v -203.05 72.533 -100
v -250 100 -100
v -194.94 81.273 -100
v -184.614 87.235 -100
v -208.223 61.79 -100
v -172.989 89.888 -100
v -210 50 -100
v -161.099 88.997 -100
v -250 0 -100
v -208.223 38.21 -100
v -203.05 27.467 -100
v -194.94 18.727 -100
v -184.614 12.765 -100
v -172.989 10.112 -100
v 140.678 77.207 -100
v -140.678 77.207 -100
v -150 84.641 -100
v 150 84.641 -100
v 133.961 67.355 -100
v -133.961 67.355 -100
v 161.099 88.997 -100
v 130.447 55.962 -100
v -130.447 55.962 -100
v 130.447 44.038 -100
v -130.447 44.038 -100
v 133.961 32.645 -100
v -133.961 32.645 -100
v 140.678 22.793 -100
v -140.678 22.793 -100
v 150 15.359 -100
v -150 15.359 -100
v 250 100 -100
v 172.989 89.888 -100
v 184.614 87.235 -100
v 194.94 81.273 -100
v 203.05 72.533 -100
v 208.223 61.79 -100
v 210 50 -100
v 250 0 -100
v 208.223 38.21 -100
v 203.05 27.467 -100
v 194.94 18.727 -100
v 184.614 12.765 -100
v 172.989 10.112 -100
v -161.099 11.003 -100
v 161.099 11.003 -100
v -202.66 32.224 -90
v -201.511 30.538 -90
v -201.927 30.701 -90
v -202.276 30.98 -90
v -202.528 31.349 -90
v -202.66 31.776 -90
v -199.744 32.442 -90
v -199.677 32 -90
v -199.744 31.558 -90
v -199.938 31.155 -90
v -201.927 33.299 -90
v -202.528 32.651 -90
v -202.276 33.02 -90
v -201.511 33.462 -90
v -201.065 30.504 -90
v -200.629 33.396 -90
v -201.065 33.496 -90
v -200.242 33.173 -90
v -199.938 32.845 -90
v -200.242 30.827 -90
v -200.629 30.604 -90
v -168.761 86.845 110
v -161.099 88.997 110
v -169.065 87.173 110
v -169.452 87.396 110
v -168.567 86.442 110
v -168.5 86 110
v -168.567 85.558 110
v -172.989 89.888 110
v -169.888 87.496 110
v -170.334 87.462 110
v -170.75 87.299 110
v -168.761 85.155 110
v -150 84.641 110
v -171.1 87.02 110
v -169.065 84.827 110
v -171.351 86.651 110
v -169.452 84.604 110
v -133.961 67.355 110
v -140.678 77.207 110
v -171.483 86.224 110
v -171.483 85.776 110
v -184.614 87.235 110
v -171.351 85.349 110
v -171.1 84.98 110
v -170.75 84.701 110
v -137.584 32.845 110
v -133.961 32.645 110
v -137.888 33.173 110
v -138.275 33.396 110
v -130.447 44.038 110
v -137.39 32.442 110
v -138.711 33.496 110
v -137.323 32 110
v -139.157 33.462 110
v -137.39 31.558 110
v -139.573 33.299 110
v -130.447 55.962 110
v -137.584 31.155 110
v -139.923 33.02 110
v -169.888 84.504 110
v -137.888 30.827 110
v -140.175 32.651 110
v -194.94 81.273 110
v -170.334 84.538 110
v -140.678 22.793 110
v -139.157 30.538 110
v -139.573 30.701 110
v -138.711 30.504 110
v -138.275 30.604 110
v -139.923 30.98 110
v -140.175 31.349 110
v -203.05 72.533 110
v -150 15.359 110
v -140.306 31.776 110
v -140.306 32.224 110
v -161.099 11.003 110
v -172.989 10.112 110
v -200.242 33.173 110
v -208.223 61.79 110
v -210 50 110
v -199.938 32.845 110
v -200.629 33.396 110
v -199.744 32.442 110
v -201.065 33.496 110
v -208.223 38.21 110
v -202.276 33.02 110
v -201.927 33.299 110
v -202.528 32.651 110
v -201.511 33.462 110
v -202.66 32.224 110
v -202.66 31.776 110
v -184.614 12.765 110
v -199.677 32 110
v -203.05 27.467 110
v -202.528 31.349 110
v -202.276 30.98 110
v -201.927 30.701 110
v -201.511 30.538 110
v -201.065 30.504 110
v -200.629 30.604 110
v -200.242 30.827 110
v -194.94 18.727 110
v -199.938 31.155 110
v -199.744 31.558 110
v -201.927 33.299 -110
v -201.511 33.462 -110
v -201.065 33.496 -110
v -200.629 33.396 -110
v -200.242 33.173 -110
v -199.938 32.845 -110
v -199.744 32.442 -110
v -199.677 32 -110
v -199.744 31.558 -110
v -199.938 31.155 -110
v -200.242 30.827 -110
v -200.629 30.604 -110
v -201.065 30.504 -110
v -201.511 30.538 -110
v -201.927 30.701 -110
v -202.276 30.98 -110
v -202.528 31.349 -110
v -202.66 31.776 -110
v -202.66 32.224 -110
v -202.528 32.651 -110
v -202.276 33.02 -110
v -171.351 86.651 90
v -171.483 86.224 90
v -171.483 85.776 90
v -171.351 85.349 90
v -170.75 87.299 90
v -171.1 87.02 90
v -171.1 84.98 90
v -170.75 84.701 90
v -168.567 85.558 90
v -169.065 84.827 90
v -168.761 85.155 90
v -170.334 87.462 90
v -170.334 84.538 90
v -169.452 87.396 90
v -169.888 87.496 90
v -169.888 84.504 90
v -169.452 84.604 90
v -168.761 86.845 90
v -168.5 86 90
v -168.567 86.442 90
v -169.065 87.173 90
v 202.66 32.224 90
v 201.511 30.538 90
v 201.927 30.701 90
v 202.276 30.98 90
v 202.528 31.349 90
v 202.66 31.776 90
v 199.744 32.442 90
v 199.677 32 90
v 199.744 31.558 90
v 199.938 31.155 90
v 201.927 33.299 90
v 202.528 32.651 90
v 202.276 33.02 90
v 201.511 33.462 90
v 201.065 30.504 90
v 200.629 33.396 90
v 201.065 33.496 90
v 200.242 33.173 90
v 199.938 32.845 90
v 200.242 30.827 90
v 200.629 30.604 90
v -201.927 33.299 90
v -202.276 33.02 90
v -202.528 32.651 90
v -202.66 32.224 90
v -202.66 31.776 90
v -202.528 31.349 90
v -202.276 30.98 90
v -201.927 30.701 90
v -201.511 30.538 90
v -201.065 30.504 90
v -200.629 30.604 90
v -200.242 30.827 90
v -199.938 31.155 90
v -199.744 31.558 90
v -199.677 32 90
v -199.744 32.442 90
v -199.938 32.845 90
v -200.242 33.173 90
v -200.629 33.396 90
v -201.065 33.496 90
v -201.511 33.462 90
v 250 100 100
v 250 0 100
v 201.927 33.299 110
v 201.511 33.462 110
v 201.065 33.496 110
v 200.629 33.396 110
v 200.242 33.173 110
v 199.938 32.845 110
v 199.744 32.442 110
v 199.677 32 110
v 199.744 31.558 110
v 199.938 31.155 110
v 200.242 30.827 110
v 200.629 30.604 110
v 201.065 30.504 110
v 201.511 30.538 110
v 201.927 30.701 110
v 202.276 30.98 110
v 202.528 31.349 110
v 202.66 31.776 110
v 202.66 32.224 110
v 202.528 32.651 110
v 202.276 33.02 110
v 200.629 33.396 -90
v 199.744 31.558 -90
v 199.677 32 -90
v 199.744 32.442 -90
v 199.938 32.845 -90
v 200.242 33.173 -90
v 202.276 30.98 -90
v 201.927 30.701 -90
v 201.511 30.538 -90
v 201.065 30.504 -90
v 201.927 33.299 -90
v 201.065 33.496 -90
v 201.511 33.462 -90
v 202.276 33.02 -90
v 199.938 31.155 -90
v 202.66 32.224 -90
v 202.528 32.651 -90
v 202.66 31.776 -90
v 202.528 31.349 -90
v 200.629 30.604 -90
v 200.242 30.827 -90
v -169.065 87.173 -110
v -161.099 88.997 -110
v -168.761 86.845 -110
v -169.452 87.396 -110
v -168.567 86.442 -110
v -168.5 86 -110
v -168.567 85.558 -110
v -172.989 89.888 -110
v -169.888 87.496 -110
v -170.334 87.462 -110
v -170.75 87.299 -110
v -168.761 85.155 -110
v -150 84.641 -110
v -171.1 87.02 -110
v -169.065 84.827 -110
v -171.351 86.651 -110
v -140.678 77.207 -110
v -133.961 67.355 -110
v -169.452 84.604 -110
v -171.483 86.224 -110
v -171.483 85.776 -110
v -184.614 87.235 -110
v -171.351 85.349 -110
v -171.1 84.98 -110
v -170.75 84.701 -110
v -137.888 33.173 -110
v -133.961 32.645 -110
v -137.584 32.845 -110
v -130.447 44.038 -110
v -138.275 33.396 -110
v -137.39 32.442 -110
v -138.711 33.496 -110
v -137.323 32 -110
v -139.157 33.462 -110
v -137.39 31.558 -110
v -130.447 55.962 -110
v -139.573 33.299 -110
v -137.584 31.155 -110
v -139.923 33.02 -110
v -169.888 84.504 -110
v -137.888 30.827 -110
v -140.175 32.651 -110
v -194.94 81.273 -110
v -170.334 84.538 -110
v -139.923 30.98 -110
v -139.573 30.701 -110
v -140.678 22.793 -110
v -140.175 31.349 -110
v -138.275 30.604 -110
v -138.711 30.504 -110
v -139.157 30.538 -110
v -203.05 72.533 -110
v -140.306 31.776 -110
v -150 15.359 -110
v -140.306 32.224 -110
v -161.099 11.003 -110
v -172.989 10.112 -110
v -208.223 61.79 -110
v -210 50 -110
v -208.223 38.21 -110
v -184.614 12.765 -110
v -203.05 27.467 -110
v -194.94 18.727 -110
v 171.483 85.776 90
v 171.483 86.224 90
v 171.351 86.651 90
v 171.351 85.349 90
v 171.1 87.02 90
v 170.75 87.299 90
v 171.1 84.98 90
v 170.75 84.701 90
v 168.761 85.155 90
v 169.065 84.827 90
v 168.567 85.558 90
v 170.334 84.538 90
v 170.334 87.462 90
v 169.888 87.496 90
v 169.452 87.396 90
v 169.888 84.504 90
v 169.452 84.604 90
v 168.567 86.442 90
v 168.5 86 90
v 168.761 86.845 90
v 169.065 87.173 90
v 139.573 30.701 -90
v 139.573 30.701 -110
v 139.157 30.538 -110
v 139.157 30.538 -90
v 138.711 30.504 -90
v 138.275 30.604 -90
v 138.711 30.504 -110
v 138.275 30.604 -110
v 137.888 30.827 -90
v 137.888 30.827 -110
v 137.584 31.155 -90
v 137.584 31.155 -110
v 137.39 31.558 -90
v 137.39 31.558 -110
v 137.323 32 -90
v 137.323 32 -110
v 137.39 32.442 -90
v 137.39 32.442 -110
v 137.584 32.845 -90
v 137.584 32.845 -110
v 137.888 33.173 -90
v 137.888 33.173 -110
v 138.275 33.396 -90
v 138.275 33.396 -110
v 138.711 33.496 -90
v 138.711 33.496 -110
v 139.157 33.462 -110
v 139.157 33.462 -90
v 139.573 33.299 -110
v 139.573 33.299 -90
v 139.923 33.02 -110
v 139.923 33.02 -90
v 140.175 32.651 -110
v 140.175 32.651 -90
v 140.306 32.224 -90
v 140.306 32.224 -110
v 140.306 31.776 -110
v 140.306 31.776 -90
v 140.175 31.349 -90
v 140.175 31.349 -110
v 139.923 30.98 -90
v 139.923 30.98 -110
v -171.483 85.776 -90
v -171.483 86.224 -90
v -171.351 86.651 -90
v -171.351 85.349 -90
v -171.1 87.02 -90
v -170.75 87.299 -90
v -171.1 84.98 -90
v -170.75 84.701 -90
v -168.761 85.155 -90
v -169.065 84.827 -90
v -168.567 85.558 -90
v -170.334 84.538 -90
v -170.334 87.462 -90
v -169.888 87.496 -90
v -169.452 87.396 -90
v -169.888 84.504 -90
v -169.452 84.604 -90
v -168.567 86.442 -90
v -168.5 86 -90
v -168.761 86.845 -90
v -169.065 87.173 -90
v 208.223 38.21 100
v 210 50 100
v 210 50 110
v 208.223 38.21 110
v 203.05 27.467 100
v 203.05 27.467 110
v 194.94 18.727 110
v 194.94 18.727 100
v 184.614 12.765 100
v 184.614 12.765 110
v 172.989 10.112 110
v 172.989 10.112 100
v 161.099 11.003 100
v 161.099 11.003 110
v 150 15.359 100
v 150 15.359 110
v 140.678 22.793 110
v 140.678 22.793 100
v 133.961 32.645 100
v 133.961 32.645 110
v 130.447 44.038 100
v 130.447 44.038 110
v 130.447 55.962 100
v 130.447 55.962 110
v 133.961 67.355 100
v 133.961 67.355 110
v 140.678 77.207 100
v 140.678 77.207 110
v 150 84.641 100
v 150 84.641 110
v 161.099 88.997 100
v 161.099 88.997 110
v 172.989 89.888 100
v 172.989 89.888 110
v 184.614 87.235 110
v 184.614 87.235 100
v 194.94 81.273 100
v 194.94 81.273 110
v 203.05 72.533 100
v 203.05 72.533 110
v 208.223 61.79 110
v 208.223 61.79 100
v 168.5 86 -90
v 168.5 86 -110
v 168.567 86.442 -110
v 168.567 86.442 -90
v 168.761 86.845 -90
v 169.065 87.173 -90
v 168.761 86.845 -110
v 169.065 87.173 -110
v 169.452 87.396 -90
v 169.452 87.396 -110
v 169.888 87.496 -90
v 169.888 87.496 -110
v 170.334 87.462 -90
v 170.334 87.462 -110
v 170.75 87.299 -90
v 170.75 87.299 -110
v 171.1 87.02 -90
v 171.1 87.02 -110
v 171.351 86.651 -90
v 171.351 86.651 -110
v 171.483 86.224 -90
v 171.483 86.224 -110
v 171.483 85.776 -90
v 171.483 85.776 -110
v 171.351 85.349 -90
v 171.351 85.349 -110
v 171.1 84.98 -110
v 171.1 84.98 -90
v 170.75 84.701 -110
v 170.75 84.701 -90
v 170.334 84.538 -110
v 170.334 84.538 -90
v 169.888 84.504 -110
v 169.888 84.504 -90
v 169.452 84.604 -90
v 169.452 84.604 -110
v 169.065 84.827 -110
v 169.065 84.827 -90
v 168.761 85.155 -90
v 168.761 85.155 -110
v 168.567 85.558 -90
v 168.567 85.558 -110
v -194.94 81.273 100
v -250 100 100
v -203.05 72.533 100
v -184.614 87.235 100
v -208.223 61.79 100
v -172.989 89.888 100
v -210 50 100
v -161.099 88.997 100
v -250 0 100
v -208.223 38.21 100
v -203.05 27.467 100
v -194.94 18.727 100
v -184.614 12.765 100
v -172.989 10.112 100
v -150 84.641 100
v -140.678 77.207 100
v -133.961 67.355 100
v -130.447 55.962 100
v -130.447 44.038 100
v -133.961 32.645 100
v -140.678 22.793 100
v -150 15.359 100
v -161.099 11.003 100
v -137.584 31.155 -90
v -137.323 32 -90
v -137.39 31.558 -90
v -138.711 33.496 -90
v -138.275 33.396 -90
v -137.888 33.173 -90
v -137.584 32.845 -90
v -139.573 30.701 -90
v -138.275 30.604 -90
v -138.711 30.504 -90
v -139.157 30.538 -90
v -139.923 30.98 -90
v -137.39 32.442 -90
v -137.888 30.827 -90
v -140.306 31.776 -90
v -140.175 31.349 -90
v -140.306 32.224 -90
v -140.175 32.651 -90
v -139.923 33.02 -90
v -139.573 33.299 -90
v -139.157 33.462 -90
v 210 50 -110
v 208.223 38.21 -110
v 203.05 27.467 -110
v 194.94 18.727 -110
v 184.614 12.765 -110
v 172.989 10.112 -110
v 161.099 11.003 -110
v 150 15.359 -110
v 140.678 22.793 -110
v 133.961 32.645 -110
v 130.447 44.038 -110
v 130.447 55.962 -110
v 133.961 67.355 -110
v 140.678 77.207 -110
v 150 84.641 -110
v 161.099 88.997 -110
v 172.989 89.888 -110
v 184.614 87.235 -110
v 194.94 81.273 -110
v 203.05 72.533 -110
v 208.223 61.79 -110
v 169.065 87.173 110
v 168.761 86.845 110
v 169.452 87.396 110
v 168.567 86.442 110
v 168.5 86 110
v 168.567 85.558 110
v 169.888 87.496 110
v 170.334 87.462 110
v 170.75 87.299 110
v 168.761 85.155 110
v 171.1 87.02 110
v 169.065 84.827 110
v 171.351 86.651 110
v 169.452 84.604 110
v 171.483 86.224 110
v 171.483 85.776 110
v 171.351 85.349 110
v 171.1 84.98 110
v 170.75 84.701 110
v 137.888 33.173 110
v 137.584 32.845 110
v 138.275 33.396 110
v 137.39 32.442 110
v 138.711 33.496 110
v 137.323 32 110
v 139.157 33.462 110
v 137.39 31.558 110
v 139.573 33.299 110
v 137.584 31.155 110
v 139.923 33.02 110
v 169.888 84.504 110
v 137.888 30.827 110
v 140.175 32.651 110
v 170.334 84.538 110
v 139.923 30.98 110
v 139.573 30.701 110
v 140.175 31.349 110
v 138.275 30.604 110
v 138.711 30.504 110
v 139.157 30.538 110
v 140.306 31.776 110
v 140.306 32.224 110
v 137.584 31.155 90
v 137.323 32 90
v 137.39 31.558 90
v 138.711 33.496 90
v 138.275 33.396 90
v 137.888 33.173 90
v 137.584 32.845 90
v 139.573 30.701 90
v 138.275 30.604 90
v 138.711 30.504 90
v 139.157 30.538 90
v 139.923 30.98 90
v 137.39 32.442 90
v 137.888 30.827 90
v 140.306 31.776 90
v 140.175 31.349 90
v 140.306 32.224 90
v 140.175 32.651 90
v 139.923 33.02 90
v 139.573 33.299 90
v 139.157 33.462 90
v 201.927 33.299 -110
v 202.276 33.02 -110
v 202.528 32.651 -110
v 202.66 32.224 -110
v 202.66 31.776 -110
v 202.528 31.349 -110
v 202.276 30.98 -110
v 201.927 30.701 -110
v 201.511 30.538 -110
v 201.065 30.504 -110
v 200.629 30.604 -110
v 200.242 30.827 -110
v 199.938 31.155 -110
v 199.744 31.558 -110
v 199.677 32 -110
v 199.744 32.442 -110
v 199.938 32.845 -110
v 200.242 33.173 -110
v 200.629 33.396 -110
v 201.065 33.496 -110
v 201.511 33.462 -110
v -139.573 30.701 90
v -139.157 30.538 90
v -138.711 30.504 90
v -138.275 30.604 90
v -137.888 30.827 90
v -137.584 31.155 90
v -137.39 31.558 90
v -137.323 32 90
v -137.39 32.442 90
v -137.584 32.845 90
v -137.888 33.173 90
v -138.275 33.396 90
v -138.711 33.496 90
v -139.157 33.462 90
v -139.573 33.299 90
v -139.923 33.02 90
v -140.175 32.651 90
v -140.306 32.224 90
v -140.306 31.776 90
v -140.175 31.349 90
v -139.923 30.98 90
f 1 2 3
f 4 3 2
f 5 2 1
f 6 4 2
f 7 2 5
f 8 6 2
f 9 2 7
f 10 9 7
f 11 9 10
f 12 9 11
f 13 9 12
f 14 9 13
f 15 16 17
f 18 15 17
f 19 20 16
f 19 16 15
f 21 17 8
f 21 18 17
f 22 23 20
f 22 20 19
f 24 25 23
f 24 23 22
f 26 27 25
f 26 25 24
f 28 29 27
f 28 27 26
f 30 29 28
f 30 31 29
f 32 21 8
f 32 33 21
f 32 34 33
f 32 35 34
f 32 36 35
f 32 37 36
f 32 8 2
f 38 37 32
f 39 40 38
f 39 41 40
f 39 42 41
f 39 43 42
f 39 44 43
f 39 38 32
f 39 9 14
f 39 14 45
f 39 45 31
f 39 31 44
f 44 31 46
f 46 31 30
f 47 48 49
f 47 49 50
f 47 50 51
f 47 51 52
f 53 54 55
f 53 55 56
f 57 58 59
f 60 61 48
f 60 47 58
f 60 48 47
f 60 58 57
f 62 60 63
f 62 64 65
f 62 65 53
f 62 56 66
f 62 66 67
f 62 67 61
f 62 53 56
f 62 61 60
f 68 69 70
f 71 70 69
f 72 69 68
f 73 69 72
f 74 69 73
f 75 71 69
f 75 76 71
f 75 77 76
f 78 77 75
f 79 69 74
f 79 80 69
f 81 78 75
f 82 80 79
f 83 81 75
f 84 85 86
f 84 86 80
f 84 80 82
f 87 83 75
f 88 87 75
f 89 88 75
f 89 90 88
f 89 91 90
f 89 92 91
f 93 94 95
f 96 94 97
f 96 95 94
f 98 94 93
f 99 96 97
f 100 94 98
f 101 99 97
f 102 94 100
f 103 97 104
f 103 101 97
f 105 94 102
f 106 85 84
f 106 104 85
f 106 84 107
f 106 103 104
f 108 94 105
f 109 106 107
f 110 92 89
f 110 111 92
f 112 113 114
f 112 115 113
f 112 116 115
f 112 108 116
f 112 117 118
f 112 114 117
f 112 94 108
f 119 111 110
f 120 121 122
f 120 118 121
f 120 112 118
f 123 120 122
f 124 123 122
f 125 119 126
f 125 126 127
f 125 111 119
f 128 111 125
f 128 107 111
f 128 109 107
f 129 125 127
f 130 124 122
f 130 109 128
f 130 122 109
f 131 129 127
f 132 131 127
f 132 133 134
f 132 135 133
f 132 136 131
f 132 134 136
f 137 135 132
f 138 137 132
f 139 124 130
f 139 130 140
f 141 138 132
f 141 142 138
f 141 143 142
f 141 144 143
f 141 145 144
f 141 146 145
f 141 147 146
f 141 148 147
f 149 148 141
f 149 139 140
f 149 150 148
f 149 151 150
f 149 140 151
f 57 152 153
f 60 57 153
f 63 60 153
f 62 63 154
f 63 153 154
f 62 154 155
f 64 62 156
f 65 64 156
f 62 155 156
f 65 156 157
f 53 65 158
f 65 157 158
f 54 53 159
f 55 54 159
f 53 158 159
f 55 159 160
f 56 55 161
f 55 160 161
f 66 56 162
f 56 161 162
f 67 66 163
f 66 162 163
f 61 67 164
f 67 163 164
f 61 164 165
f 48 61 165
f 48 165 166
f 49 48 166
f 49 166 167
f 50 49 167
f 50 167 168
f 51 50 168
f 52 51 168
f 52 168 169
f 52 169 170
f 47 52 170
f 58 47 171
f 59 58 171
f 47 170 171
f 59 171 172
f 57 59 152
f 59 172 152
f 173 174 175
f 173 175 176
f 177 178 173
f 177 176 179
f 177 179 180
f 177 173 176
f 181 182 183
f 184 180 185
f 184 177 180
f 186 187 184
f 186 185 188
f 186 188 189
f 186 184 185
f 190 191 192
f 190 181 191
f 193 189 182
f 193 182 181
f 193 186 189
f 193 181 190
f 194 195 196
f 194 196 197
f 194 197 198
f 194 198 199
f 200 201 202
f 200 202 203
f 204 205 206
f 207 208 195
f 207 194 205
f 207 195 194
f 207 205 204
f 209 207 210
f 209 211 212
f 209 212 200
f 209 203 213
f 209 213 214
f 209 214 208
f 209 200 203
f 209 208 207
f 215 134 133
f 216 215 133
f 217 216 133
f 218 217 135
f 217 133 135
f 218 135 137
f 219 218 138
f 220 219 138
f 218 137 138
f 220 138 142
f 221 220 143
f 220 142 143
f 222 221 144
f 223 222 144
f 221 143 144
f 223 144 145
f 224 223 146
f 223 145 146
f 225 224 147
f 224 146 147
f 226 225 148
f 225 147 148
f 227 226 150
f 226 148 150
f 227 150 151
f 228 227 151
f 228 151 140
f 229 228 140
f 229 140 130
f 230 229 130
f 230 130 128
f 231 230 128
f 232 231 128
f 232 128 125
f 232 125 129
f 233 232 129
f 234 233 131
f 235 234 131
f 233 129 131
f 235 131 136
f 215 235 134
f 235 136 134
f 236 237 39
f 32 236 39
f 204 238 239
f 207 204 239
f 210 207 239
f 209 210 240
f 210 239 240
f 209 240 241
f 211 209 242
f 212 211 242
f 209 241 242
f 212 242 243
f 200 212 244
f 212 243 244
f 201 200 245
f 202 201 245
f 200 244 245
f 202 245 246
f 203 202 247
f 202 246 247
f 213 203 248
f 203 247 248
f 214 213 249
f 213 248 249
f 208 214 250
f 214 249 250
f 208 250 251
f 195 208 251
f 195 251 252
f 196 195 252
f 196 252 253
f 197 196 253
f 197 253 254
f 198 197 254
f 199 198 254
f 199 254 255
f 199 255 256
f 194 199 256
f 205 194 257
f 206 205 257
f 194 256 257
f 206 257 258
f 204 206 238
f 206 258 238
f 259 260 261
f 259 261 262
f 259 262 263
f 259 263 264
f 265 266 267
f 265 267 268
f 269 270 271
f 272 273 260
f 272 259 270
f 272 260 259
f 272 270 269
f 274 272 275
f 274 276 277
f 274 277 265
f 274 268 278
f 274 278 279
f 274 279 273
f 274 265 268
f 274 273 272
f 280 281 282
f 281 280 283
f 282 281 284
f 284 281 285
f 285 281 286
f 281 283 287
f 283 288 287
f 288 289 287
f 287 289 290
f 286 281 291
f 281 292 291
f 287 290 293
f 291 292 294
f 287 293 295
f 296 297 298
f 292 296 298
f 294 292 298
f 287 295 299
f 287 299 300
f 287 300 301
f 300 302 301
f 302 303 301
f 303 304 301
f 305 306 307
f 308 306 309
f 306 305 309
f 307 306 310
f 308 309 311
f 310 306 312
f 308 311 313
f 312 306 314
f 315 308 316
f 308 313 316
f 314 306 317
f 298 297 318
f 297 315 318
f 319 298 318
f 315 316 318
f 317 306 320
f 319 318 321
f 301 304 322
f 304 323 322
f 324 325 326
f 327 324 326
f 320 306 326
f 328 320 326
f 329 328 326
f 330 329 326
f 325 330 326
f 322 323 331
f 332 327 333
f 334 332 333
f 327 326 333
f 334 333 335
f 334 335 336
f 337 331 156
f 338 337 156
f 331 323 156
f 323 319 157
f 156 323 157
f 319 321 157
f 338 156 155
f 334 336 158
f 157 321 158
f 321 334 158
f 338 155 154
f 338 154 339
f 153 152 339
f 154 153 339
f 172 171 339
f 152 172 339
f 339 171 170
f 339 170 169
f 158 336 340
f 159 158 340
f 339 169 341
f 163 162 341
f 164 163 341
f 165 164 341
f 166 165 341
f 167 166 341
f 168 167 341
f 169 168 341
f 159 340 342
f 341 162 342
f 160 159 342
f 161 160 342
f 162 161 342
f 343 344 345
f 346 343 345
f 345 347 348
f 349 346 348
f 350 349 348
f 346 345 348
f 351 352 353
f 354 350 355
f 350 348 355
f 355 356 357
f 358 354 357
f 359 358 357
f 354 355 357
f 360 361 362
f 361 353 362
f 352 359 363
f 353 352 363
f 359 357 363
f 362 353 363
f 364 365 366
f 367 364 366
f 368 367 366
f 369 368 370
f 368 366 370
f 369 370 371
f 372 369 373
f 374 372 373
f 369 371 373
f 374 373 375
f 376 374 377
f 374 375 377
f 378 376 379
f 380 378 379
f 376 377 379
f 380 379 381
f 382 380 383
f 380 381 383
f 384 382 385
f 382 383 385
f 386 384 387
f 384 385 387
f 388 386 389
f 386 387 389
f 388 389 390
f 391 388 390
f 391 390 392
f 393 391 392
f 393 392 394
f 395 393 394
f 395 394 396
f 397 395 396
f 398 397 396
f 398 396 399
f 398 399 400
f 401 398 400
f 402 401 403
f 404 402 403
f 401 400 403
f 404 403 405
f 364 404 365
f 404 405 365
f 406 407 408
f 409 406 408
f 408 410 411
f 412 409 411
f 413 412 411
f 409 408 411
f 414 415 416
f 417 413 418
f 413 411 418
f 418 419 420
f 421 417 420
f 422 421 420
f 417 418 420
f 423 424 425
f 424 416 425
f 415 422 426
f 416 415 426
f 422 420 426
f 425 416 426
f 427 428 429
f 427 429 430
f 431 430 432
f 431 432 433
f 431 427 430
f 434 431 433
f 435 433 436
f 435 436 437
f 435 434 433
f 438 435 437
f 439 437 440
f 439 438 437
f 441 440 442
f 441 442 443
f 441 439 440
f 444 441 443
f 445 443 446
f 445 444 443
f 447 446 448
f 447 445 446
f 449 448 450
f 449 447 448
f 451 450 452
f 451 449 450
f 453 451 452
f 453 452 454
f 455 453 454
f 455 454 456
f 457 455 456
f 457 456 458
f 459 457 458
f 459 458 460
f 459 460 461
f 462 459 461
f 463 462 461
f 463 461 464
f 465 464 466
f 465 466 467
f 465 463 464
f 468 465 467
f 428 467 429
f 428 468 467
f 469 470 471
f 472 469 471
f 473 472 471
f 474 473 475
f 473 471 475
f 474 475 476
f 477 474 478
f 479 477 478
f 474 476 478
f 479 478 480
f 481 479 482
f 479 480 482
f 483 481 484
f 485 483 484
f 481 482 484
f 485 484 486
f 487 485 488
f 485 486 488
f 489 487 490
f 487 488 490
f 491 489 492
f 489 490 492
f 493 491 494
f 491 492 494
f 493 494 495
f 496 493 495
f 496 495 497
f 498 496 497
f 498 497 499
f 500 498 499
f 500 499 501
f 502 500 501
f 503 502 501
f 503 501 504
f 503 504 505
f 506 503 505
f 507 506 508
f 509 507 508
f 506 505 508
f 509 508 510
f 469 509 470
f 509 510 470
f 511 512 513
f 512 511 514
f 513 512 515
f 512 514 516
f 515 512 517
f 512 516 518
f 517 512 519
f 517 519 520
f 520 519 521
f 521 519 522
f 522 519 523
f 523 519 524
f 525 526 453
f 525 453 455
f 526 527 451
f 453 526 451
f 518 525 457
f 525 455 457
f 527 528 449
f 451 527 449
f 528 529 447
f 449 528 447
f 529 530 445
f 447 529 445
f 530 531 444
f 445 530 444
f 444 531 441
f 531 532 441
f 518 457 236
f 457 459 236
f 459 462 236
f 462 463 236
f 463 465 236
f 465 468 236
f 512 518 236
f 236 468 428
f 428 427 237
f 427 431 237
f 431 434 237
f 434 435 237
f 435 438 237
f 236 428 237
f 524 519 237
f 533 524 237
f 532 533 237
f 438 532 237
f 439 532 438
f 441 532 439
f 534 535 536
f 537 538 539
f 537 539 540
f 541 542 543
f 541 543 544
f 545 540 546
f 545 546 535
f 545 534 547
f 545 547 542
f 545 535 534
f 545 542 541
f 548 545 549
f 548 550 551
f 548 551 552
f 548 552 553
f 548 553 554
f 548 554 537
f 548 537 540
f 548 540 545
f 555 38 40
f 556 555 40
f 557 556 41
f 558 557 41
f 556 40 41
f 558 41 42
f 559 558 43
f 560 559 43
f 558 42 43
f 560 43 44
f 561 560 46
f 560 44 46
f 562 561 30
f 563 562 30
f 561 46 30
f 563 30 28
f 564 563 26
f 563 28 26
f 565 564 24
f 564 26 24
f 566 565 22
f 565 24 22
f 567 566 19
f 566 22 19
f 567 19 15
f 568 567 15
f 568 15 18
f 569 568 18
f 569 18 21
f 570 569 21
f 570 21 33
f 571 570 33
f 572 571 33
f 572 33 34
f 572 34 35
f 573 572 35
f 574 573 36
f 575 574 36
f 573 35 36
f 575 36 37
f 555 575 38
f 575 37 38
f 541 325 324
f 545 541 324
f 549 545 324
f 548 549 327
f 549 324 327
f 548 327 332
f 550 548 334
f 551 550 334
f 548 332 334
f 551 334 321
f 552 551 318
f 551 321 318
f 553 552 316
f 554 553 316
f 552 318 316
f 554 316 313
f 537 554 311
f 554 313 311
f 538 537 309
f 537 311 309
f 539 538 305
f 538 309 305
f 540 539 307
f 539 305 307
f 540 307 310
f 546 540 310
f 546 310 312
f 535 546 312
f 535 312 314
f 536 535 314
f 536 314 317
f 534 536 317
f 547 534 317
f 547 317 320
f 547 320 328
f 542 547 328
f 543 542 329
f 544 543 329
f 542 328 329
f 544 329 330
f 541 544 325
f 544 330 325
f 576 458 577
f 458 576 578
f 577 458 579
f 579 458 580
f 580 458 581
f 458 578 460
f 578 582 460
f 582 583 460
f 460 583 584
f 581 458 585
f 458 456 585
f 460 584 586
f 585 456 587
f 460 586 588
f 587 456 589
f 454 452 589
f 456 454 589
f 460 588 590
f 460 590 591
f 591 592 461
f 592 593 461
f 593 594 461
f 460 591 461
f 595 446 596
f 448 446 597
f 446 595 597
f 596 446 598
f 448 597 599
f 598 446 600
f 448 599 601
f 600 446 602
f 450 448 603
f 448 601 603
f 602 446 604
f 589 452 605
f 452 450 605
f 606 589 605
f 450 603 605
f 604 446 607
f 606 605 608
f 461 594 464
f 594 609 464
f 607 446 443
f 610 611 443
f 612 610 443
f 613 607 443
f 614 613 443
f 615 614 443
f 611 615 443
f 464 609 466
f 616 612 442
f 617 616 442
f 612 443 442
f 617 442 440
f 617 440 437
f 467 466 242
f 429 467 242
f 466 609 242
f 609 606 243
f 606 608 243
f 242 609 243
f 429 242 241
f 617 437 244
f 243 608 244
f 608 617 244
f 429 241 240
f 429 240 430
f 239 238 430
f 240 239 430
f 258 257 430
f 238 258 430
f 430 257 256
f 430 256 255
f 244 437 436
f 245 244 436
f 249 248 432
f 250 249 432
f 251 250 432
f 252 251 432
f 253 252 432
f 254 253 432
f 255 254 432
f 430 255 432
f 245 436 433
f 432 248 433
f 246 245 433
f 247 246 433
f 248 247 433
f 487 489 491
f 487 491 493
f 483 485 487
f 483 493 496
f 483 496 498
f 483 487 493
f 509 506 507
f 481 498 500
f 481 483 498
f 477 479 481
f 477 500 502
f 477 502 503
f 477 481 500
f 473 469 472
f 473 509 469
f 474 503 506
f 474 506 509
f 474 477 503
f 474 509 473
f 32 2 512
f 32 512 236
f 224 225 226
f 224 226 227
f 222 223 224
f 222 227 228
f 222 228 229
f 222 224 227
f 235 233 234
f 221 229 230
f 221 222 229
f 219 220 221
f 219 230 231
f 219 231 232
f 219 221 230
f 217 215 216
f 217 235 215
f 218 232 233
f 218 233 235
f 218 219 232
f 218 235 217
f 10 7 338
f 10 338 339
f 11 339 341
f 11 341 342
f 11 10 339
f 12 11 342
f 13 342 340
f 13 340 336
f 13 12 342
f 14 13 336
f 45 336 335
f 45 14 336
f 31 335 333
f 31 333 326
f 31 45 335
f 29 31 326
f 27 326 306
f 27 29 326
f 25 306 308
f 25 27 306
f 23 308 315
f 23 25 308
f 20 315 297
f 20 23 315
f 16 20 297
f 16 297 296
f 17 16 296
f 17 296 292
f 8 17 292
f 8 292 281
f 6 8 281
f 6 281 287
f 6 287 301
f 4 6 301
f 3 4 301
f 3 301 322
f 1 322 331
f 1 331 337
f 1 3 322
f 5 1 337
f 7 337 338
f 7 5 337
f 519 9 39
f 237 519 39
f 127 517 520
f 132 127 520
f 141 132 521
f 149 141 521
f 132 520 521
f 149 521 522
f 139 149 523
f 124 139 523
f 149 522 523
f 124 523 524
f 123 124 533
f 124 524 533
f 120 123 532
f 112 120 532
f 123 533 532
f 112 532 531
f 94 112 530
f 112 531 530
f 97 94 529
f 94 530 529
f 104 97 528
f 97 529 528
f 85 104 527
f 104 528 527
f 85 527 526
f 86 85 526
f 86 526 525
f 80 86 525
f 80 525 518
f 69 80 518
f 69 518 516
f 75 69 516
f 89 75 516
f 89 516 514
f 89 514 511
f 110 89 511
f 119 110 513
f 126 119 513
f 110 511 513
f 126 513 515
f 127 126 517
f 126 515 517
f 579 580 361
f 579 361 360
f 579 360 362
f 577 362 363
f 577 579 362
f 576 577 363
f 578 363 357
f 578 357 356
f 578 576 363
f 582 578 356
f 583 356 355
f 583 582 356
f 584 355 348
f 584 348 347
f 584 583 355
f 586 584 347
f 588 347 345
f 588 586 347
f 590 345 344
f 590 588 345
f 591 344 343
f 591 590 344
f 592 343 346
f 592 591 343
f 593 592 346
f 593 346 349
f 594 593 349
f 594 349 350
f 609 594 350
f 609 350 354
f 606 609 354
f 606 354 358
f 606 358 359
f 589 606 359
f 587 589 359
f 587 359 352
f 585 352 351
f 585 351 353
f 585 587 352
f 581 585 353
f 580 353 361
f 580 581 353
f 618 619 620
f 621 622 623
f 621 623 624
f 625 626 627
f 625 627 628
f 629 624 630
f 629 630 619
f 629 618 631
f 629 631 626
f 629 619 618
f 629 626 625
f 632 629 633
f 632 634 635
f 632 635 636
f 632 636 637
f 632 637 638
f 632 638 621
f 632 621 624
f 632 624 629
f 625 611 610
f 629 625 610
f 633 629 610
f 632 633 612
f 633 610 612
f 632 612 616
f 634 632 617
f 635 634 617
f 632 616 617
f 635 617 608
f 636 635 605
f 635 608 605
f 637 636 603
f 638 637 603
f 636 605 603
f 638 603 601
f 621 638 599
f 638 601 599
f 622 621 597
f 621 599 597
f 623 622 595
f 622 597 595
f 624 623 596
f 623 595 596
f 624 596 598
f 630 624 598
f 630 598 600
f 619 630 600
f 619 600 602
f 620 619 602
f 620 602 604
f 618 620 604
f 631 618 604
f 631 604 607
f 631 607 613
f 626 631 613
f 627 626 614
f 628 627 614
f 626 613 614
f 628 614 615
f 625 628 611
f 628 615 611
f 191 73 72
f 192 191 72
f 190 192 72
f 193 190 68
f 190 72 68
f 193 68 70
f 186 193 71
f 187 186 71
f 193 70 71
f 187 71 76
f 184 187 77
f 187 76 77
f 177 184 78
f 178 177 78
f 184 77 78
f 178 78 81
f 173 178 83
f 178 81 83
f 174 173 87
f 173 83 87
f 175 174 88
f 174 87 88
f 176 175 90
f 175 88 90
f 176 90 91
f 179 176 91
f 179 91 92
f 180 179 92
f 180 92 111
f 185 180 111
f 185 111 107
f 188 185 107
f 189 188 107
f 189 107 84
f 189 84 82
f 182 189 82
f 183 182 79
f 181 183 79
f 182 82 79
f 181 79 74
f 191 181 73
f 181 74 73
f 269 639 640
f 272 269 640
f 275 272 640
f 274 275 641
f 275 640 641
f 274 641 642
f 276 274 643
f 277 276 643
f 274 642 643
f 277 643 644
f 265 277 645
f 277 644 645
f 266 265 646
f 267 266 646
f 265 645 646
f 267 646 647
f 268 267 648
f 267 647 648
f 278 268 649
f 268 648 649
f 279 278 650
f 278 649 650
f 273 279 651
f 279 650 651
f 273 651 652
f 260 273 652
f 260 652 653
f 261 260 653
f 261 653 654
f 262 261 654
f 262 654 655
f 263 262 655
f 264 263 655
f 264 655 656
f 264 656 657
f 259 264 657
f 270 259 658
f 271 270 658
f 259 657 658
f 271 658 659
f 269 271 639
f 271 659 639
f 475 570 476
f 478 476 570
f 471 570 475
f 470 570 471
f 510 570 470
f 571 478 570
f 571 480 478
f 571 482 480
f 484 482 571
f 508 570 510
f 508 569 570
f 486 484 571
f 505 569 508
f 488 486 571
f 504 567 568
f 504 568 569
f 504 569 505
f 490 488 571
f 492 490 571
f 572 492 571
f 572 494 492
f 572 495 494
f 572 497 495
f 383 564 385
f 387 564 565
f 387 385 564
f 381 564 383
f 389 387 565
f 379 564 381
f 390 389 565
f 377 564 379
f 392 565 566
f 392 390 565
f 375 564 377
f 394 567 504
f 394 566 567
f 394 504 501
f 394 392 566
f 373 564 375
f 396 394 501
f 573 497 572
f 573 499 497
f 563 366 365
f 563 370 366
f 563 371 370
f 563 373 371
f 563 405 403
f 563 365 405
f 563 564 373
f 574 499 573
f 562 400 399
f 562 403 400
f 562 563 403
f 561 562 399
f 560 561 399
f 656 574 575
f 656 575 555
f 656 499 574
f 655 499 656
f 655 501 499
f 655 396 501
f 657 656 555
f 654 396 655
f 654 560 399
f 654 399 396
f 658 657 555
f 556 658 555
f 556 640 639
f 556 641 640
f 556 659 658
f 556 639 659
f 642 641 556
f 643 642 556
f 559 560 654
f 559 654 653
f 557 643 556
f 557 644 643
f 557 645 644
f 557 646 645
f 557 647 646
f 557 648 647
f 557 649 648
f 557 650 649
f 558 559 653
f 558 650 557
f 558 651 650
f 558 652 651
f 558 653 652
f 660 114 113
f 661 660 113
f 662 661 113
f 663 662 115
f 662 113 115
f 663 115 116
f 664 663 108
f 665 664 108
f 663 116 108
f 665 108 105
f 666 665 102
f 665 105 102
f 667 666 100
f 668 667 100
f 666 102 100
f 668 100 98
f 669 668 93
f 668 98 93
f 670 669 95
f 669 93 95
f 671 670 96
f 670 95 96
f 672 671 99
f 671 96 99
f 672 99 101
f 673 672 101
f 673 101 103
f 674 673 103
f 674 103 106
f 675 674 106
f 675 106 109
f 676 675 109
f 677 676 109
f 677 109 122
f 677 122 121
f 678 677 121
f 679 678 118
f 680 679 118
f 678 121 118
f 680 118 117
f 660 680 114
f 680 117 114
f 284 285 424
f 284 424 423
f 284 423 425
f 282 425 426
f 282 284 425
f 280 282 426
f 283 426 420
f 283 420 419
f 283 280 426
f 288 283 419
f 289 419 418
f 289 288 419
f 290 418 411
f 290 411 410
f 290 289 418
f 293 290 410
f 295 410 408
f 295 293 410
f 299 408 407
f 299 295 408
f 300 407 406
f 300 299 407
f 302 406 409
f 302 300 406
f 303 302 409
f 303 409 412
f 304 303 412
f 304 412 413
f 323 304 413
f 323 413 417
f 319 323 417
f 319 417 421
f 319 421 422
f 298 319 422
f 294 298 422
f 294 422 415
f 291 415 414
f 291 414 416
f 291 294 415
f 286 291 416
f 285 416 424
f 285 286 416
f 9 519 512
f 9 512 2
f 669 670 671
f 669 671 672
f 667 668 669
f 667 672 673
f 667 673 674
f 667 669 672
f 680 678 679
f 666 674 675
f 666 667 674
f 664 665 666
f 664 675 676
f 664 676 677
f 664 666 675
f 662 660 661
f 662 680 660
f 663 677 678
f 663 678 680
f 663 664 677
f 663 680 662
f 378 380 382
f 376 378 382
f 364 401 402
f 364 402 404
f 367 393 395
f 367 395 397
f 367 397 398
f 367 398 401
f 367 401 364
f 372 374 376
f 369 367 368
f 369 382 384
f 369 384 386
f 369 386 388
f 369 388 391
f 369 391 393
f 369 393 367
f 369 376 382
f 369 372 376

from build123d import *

# Parameters (mm, degrees)
SKETCH1_W               = 500
SKETCH1_H               = 200
BOSS_EXTRUDE1_DEPTH     = 100
SKETCH2_R               = 40
BOSS_EXTRUDE2_DEPTH     = 10
SKETCH5_R               = 1.5
CUT_EXTRUDE3_DEPTH      = 20
CIRPATTERN2_COUNT       = 3
MIRROR4_COPY_1_SKETCH_R = 1.5
MIRROR4_COPY_1_DEPTH    = 20
MIRROR4_COPY_2_SKETCH_R = 1.5
MIRROR4_COPY_2_DEPTH    = 20
MIRROR5_COPY_1_SKETCH_R = 1.5
MIRROR5_COPY_1_DEPTH    = 20
MIRROR5_COPY_2_SKETCH_R = 1.5
MIRROR5_COPY_2_DEPTH    = 20
MIRROR5_COPY_3_SKETCH_R = 40
MIRROR5_COPY_3_DEPTH    = 10
MIRROR5_COPY_4_SKETCH_R = 1.5
MIRROR5_COPY_4_DEPTH    = 20
MIRROR5_COPY_5_SKETCH_R = 1.5
MIRROR5_COPY_5_DEPTH    = 20
MIRROR5_COPY_6_SKETCH_R = 1.5
MIRROR5_COPY_6_DEPTH    = 20


with BuildPart() as part:
    # Sketch1 → Boss-Extrude1 (new body)
    with BuildSketch(Plane(origin=(0, 0, 0), x_dir=(1, 0, 0), z_dir=(0, 1, 0))):
        Rectangle(SKETCH1_W, SKETCH1_H)
    extrude(amount=BOSS_EXTRUDE1_DEPTH)

    # Sketch2 → Boss-Extrude2 (add)
    with BuildSketch(Plane.XY.offset(100)):
        with Locations(Location((-170, 50, 0), (0, 0, 180))):
            Circle(SKETCH2_R)
    boss_extrude2 = extrude(amount=BOSS_EXTRUDE2_DEPTH)

    # Sketch5 → Cut-Extrude3 (cut)
    with BuildSketch(Plane.XY.offset(110)):
        with Locations((-170, 86)):
            Circle(SKETCH5_R)
    cut_extrude3 = extrude(amount=-CUT_EXTRUDE3_DEPTH, mode=Mode.SUBTRACT)

    # CirPattern2: Cut-Extrude3 ×3 about axis
    cirpattern2_axis = Axis((-170, 50, 0), (0, 0, 1))
    for i in range(1, CIRPATTERN2_COUNT):
        add(cut_extrude3.rotate(cirpattern2_axis, i * 360 / CIRPATTERN2_COUNT), mode=Mode.SUBTRACT)

    # Mirror4: Boss-Extrude2, Cut-Extrude3 across plane
    add(boss_extrude2.mirror(Plane(origin=(0, 0, 0), x_dir=(0, 0, 1), z_dir=(1, 0, 0))))
    add(cut_extrude3.mirror(Plane(origin=(0, 0, 0), x_dir=(0, 0, 1), z_dir=(1, 0, 0))), mode=Mode.SUBTRACT)

    # Mirror4 copy 1 sketch → Mirror4 copy 1 (cut)
    with BuildSketch(Plane(origin=(211.698729811, 222.224318643, 110), x_dir=(0.4999999999999998, 0.8660254037844387, 0), z_dir=(0, 0, 1))):
        with Locations((-170, -86)):
            Circle(MIRROR4_COPY_1_SKETCH_R)
    extrude(amount=-MIRROR4_COPY_1_DEPTH, mode=Mode.SUBTRACT)

    # Mirror4 copy 2 sketch → Mirror4 copy 2 (cut)
    with BuildSketch(Plane(origin=(298.301270189, -72.224318643, 110), x_dir=(0.5000000000000004, -0.8660254037844384, 0), z_dir=(0, 0, 1))):
        with Locations((-170, -86)):
            Circle(MIRROR4_COPY_2_SKETCH_R)
    extrude(amount=-MIRROR4_COPY_2_DEPTH, mode=Mode.SUBTRACT)

    # Mirror5: Boss-Extrude2, Cut-Extrude3 across plane
    add(boss_extrude2.mirror(Plane.XY))
    add(cut_extrude3.mirror(Plane.XY), mode=Mode.SUBTRACT)

    # Mirror5 copy 1 sketch → Mirror5 copy 1 (cut)
    with BuildSketch(Plane(origin=(-211.698729811, 222.224318643, -110), x_dir=(-0.4999999999999998, 0.8660254037844387, 0), z_dir=(0, 0, -1))):
        with Locations((-170, -86)):
            Circle(MIRROR5_COPY_1_SKETCH_R)
    extrude(amount=-MIRROR5_COPY_1_DEPTH, mode=Mode.SUBTRACT)

    # Mirror5 copy 2 sketch → Mirror5 copy 2 (cut)
    with BuildSketch(Plane(origin=(-298.301270189, -72.224318643, -110), x_dir=(-0.5000000000000004, -0.8660254037844384, 0), z_dir=(0, 0, -1))):
        with Locations((-170, -86)):
            Circle(MIRROR5_COPY_2_SKETCH_R)
    extrude(amount=-MIRROR5_COPY_2_DEPTH, mode=Mode.SUBTRACT)

    # Mirror5 copy 3 sketch → Mirror5 copy 3 (add)
    with BuildSketch(Plane(origin=(0, 0, -100), x_dir=(-1, 0, 0), z_dir=(0, 0, -1))):
        with Locations(Location((-170, 50, 0), (0, 0, 180))):
            Circle(MIRROR5_COPY_3_SKETCH_R)
    extrude(amount=MIRROR5_COPY_3_DEPTH)

    # Mirror5 copy 4 sketch → Mirror5 copy 4 (cut)
    with BuildSketch(Plane(origin=(0, 0, -110), x_dir=(-1, 0, 0), z_dir=(0, 0, -1))):
        with Locations((-170, 86)):
            Circle(MIRROR5_COPY_4_SKETCH_R)
    extrude(amount=-MIRROR5_COPY_4_DEPTH, mode=Mode.SUBTRACT)

    # Mirror5 copy 5 sketch → Mirror5 copy 5 (cut)
    with BuildSketch(Plane(origin=(211.698729811, 222.224318643, -110), x_dir=(0.4999999999999998, 0.8660254037844387, 0), z_dir=(0, 0, -1))):
        with Locations((-170, 86)):
            Circle(MIRROR5_COPY_5_SKETCH_R)
    extrude(amount=-MIRROR5_COPY_5_DEPTH, mode=Mode.SUBTRACT)

    # Mirror5 copy 6 sketch → Mirror5 copy 6 (cut)
    with BuildSketch(Plane(origin=(298.301270189, -72.224318643, -110), x_dir=(0.5000000000000004, -0.8660254037844384, 0), z_dir=(0, 0, -1))):
        with Locations((-170, 86)):
            Circle(MIRROR5_COPY_6_SKETCH_R)
    extrude(amount=-MIRROR5_COPY_6_DEPTH, mode=Mode.SUBTRACT)


solid = part.part
